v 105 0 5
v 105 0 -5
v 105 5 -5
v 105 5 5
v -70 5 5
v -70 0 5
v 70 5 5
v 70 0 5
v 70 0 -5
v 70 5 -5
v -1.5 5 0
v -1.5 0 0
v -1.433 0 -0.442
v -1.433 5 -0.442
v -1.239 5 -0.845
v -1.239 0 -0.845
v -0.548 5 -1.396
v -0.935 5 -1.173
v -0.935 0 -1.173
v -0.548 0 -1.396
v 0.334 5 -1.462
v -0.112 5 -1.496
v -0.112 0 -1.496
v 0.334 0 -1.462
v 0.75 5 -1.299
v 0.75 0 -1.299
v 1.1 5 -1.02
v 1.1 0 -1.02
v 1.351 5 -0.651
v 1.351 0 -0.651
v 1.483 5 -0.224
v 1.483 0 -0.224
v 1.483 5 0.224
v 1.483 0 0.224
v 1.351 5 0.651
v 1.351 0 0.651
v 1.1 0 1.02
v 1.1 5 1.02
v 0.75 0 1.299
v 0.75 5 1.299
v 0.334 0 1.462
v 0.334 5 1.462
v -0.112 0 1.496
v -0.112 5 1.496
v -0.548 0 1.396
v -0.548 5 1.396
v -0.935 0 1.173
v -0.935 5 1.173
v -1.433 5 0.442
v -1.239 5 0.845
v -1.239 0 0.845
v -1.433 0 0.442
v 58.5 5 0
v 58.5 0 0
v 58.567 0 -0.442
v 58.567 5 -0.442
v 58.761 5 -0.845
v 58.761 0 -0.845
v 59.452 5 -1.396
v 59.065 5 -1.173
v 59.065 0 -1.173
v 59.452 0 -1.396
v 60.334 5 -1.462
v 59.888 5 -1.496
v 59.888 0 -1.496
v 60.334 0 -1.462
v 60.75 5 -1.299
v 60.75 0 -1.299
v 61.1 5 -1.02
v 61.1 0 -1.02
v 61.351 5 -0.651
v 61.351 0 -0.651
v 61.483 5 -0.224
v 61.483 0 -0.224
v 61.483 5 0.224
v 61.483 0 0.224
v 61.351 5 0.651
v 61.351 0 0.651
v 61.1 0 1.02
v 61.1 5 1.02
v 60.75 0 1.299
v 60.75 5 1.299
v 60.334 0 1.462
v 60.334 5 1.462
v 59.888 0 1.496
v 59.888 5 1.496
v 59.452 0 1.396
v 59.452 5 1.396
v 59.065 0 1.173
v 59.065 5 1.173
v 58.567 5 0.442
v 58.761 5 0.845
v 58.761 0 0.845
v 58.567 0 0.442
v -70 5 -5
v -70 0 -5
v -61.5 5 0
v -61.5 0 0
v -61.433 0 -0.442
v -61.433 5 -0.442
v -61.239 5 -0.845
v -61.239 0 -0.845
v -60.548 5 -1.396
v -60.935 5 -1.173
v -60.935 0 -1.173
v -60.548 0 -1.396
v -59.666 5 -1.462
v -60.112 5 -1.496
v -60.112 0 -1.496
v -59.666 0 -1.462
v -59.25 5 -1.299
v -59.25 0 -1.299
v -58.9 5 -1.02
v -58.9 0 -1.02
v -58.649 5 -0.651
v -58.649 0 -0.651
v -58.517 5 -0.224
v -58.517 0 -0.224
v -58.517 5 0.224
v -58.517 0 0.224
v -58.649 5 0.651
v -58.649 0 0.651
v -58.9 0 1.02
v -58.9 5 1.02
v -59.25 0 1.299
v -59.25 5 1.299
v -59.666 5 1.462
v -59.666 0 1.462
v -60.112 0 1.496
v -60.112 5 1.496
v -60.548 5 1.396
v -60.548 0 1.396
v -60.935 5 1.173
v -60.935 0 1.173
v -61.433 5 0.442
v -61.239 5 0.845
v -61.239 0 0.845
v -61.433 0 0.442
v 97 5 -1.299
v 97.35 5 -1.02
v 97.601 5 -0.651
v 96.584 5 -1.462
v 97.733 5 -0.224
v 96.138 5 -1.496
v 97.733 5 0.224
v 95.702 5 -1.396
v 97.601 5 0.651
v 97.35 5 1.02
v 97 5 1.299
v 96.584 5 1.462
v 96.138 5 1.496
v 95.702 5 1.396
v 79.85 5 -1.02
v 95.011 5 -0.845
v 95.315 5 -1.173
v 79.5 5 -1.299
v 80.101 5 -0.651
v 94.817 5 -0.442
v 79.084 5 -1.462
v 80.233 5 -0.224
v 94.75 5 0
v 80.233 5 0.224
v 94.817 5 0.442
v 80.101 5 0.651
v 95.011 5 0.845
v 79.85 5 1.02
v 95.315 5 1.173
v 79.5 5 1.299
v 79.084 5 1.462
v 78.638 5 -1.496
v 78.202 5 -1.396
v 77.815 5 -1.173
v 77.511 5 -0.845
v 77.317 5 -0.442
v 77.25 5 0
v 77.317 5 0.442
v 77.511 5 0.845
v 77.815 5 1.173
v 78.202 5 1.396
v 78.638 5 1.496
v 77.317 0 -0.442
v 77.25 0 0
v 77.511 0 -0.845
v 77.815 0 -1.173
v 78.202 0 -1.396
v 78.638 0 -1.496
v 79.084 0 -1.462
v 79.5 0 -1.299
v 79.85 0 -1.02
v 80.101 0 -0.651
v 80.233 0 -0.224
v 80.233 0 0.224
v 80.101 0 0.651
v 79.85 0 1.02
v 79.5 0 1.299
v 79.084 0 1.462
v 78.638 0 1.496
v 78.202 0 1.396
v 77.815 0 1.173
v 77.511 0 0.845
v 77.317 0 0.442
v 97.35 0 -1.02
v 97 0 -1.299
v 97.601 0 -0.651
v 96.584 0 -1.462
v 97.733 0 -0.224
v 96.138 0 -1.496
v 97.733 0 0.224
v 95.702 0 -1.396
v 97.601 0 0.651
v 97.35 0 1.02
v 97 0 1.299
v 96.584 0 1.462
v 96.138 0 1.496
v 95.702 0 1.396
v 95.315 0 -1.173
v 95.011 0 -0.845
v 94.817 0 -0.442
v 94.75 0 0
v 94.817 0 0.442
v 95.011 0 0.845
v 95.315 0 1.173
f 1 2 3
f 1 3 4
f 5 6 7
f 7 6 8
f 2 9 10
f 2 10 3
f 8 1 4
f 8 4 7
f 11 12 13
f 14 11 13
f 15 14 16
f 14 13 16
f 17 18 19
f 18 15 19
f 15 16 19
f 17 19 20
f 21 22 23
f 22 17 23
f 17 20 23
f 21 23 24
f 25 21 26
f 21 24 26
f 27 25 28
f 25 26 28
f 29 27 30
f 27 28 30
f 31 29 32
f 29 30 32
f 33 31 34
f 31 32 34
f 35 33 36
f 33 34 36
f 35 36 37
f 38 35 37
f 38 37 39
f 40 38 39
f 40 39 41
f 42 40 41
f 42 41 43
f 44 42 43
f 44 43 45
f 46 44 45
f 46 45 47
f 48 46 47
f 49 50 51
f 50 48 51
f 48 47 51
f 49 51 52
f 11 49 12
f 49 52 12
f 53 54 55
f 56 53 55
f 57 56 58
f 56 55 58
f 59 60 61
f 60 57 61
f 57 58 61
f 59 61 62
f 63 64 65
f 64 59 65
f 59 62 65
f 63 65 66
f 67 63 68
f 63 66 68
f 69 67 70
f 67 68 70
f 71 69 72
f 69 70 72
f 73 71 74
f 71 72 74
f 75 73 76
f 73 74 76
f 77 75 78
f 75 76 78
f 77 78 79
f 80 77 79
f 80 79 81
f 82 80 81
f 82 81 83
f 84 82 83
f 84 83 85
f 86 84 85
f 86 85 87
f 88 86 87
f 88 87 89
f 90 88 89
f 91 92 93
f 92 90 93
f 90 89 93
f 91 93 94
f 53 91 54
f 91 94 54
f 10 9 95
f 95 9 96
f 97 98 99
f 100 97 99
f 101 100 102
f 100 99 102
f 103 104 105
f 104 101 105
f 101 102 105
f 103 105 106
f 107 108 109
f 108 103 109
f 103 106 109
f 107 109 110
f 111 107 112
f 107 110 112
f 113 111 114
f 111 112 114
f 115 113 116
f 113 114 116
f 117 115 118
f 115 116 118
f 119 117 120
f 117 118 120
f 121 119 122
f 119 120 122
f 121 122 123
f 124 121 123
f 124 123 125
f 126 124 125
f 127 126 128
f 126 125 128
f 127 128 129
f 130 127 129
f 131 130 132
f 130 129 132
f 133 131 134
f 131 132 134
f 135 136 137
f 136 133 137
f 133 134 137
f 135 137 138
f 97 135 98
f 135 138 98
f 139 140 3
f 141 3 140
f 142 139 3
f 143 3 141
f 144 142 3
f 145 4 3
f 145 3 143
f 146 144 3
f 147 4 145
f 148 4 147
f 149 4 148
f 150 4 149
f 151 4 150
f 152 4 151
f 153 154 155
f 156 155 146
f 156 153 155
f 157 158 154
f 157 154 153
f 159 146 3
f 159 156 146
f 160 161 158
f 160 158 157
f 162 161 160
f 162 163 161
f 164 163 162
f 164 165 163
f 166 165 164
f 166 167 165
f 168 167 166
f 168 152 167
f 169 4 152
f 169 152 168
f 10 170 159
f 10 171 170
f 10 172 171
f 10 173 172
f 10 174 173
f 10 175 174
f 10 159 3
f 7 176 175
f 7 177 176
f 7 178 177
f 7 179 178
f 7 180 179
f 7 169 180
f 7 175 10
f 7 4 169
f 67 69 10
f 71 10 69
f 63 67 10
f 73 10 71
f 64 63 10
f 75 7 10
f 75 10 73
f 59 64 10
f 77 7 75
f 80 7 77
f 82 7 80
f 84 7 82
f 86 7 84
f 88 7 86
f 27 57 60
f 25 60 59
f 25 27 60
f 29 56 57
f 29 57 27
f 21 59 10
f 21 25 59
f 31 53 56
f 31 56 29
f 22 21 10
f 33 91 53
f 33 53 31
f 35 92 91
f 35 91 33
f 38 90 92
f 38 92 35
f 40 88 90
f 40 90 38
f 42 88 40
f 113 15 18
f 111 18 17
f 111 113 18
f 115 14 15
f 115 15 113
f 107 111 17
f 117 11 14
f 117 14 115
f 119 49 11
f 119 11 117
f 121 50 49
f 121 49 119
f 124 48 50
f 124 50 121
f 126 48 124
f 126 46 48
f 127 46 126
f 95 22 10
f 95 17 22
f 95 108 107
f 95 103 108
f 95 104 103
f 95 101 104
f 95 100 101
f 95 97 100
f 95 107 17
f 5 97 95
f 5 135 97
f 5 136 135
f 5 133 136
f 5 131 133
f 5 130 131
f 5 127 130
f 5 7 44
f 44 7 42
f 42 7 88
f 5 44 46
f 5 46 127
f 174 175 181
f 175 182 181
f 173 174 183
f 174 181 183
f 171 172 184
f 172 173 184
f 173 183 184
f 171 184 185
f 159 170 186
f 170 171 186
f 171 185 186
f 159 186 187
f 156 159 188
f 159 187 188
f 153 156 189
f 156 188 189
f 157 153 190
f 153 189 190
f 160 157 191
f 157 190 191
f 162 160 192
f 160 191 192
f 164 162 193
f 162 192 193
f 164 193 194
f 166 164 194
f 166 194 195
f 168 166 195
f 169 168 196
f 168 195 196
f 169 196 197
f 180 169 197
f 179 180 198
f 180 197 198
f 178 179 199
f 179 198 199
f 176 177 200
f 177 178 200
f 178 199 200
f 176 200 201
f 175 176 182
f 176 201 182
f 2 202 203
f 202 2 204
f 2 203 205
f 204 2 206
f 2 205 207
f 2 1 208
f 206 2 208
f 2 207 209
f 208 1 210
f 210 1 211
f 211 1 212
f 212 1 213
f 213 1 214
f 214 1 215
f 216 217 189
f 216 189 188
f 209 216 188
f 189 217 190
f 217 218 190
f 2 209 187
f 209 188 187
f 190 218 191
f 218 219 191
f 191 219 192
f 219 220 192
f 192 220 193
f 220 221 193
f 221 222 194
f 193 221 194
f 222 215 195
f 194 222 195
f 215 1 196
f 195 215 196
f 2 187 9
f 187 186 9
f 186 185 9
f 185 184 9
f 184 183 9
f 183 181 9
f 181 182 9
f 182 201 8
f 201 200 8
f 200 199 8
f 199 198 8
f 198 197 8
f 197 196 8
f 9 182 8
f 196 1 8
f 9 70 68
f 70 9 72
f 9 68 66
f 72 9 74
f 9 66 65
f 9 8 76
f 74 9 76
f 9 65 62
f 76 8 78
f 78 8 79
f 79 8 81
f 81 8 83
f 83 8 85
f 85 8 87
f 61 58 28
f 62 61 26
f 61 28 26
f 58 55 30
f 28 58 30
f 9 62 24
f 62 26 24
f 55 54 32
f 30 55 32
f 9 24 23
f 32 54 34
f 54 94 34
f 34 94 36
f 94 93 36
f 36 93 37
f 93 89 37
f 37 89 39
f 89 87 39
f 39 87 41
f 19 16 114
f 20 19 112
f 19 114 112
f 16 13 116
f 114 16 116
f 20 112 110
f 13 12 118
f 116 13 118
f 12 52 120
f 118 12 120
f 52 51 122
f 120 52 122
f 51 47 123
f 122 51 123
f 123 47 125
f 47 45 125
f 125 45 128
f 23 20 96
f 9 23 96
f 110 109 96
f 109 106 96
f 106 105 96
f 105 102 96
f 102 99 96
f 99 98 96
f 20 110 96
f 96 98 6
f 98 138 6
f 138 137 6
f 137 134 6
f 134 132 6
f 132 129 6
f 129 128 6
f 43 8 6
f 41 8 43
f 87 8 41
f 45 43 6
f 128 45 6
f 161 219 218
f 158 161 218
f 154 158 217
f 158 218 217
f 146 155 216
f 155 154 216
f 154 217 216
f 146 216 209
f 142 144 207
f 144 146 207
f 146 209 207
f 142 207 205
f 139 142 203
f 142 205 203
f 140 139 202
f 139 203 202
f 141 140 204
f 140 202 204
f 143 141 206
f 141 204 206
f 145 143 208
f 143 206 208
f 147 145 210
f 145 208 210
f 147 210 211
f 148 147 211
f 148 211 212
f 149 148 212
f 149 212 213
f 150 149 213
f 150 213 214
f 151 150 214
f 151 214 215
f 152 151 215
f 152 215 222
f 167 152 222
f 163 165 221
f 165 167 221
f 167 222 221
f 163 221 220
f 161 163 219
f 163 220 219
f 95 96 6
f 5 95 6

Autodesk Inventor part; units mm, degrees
ref_plane "YZ Plane" through (0, 0, 0) normal (1, 0, 0) x (0, 1, 0)
ref_plane "XZ Plane" through (0, 0, 0) normal (0, 1, 0) x (-1, 0, 0)
ref_plane "XY Plane" through (0, 0, 0) normal (0, 0, 1) x (1, 0, 0)
sketch "Sketch1" plane through (0, 0, 0) normal (0, 1, 0) x (-1, 0, 0)
  line L0 (70, 5) -> (-70, 5)
  line L1 (-70, -5) -> (70, -5)
  line L2 (70, -5) -> (70, 5)
  line L3 (-70, -5) -> (-105, -5)
  line L4 (-105, -5) -> (-105, 5)
  line L5 (-105, 5) -> (-70, 5)
  circle A0 centre (-78.75, 0) radius 1.5
  circle A1 centre (-96.25, 0) radius 1.5
  circle A2 centre (0, 0) radius 1.5
  circle A3 centre (60, 0) radius 1.5
  circle A4 centre (-60, 0) radius 1.5
extrude "Extrusion1" add sketch "Sketch1" along normal blind 5
properties part number "batang_horn_normal"
